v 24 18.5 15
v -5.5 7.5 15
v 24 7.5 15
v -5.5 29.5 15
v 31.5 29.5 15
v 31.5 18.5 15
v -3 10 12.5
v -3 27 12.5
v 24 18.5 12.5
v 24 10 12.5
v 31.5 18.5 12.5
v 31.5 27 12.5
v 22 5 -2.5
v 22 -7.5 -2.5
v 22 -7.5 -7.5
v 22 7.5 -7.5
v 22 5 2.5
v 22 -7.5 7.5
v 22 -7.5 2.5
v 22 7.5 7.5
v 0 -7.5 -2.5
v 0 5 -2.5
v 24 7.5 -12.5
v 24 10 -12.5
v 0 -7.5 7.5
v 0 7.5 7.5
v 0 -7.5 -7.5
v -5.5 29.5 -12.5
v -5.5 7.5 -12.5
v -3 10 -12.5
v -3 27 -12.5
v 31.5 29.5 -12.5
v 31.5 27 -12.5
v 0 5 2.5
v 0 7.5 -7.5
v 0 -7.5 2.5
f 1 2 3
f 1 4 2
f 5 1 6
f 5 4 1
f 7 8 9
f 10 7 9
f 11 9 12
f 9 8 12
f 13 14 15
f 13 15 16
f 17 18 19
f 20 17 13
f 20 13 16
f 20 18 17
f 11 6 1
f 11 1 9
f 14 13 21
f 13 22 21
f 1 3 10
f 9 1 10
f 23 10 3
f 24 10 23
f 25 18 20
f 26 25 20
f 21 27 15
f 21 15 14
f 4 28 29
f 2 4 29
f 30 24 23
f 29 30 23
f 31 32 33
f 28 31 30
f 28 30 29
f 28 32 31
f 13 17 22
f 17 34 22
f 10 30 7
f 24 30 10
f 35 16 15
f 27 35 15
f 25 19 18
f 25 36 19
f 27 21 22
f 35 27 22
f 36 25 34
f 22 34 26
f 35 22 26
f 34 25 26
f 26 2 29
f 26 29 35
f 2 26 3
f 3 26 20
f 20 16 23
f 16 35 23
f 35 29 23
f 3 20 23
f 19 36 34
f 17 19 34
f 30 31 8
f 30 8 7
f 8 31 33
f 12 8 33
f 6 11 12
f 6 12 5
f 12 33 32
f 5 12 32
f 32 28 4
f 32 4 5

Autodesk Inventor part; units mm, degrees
ref_plane "YZ Plane" through (0, 0, 0) normal (1, 0, 0) x (0, 1, 0)
ref_plane "XZ Plane" through (0, 0, 0) normal (0, 1, 0) x (-1, 0, 0)
ref_plane "XY Plane" through (0, 0, 0) normal (0, 0, 1) x (1, 0, 0)
sketch "Sketch2" plane through (0, -7.5, 2.5) normal (1, 0, 0) x (0, 1, 0)
  line L0 (0, 0) -> (12.5, 0)
  line L1 (12.5, 0) -> (12.5, -5)
  line L2 (12.5, -5) -> (0, -5)
  line L3 (0, 0) -> (0, 5)
  line L4 (0, 5) -> (15, 5)
  line L5 (15, 5) -> (15, -10)
  line L6 (15, -10) -> (0, -10)
  line L7 (0, -10) -> (0, -5)
  dimension "d11" = 12.5
  dimension "d10" = 5
  dimension "d9" = 15
  dimension "d8" = 15
  dimension "d12" = 5
extrude "Extrusion2" add sketch "Sketch2" along normal blind 22
sketch "Sketch4" plane through (0, -7.5, -7.5) normal (0, 0, -1) x (-1, 0, 0)
  line L0 (0, 0) -> (0, 15) projected
  line L1 (0, 15) -> (-22, 15) projected
  line L2 (-22, 0) -> (-22, 15) projected
  line L3 (0, 0) -> (-22, 0) projected
  line L4 (5.5, 15) -> (-31.5, 15)
  line L5 (-31.5, 37) -> (-31.5, 34.5)
  line L6 (5.5, 15) -> (5.5, 37)
  line L7 (5.5, 37) -> (3, 37)
  line L8 (3, 34.5) -> (3, 17.5)
  line L9 (3, 17.5) -> (-31.5, 17.5)
  line L10 (-31.5, 17.5) -> (-31.5, 15)
  line L11 (3, 37) -> (-31.5, 37)
  line L12 (3, 34.5) -> (-31.5, 34.5)
  point P0 (0, 7.5)
  dimension "d29" = 5.5
  dimension "d32" = 19.5
  dimension "d33" = 2.5
  dimension "d34" = 2.5
  dimension "d35" = 22
  dimension "d38" = 15
  dimension "d58" = 2.5
  dimension "d65" = 37
  dimension "d66" = 34.5
  dimension "d67" = 2.5
extrude "Extrusion4" add sketch "Sketch4" against normal blind 20 and the other way blind 5 contours L1 L4 L10 L9 L8 L12 L5 L11 L7 L6
sketch "Sketch9" plane through (0, -7.5, 12.5) normal (0, 0, 1) x (1, 0, 0)
  line L0 (-5.5, 37) -> (31.5, 37) projected
  line L1 (-5.5, 37) -> (-5.5, 15) projected
  line L2 (31.5, 37) -> (-5.5, 37)
  line L3 (-5.5, 37) -> (-5.5, 15)
  line L4 (-5.5, 15) -> (31.5, 15)
  line L5 (31.5, 15) -> (31.5, 37)
  point P0 (0, 7.5)
extrude "Extrusion9" add sketch "Sketch9" along normal blind 2.5
sketch "Sketch10" plane through (31.5, 7.5, -12.5) normal (1, 0, 0) x (0, 0, -1)
  line L0 (-27.5, 22) -> (-27.5, 0) projected
  line L1 (0, 0) -> (-27.5, 0) projected
  line L2 (-27.5, 11) -> (0, 11)
  line L3 (0, 11) -> (0, 0)
  line L4 (0, 0) -> (-27.5, 0)
  line L5 (-27.5, 0) -> (-27.5, 11)
  point P0 (-12.5, -7.5)
extrude "Extrusion10" cut sketch "Sketch10" against normal blind 7.5
properties part number "battery-holder-two"
